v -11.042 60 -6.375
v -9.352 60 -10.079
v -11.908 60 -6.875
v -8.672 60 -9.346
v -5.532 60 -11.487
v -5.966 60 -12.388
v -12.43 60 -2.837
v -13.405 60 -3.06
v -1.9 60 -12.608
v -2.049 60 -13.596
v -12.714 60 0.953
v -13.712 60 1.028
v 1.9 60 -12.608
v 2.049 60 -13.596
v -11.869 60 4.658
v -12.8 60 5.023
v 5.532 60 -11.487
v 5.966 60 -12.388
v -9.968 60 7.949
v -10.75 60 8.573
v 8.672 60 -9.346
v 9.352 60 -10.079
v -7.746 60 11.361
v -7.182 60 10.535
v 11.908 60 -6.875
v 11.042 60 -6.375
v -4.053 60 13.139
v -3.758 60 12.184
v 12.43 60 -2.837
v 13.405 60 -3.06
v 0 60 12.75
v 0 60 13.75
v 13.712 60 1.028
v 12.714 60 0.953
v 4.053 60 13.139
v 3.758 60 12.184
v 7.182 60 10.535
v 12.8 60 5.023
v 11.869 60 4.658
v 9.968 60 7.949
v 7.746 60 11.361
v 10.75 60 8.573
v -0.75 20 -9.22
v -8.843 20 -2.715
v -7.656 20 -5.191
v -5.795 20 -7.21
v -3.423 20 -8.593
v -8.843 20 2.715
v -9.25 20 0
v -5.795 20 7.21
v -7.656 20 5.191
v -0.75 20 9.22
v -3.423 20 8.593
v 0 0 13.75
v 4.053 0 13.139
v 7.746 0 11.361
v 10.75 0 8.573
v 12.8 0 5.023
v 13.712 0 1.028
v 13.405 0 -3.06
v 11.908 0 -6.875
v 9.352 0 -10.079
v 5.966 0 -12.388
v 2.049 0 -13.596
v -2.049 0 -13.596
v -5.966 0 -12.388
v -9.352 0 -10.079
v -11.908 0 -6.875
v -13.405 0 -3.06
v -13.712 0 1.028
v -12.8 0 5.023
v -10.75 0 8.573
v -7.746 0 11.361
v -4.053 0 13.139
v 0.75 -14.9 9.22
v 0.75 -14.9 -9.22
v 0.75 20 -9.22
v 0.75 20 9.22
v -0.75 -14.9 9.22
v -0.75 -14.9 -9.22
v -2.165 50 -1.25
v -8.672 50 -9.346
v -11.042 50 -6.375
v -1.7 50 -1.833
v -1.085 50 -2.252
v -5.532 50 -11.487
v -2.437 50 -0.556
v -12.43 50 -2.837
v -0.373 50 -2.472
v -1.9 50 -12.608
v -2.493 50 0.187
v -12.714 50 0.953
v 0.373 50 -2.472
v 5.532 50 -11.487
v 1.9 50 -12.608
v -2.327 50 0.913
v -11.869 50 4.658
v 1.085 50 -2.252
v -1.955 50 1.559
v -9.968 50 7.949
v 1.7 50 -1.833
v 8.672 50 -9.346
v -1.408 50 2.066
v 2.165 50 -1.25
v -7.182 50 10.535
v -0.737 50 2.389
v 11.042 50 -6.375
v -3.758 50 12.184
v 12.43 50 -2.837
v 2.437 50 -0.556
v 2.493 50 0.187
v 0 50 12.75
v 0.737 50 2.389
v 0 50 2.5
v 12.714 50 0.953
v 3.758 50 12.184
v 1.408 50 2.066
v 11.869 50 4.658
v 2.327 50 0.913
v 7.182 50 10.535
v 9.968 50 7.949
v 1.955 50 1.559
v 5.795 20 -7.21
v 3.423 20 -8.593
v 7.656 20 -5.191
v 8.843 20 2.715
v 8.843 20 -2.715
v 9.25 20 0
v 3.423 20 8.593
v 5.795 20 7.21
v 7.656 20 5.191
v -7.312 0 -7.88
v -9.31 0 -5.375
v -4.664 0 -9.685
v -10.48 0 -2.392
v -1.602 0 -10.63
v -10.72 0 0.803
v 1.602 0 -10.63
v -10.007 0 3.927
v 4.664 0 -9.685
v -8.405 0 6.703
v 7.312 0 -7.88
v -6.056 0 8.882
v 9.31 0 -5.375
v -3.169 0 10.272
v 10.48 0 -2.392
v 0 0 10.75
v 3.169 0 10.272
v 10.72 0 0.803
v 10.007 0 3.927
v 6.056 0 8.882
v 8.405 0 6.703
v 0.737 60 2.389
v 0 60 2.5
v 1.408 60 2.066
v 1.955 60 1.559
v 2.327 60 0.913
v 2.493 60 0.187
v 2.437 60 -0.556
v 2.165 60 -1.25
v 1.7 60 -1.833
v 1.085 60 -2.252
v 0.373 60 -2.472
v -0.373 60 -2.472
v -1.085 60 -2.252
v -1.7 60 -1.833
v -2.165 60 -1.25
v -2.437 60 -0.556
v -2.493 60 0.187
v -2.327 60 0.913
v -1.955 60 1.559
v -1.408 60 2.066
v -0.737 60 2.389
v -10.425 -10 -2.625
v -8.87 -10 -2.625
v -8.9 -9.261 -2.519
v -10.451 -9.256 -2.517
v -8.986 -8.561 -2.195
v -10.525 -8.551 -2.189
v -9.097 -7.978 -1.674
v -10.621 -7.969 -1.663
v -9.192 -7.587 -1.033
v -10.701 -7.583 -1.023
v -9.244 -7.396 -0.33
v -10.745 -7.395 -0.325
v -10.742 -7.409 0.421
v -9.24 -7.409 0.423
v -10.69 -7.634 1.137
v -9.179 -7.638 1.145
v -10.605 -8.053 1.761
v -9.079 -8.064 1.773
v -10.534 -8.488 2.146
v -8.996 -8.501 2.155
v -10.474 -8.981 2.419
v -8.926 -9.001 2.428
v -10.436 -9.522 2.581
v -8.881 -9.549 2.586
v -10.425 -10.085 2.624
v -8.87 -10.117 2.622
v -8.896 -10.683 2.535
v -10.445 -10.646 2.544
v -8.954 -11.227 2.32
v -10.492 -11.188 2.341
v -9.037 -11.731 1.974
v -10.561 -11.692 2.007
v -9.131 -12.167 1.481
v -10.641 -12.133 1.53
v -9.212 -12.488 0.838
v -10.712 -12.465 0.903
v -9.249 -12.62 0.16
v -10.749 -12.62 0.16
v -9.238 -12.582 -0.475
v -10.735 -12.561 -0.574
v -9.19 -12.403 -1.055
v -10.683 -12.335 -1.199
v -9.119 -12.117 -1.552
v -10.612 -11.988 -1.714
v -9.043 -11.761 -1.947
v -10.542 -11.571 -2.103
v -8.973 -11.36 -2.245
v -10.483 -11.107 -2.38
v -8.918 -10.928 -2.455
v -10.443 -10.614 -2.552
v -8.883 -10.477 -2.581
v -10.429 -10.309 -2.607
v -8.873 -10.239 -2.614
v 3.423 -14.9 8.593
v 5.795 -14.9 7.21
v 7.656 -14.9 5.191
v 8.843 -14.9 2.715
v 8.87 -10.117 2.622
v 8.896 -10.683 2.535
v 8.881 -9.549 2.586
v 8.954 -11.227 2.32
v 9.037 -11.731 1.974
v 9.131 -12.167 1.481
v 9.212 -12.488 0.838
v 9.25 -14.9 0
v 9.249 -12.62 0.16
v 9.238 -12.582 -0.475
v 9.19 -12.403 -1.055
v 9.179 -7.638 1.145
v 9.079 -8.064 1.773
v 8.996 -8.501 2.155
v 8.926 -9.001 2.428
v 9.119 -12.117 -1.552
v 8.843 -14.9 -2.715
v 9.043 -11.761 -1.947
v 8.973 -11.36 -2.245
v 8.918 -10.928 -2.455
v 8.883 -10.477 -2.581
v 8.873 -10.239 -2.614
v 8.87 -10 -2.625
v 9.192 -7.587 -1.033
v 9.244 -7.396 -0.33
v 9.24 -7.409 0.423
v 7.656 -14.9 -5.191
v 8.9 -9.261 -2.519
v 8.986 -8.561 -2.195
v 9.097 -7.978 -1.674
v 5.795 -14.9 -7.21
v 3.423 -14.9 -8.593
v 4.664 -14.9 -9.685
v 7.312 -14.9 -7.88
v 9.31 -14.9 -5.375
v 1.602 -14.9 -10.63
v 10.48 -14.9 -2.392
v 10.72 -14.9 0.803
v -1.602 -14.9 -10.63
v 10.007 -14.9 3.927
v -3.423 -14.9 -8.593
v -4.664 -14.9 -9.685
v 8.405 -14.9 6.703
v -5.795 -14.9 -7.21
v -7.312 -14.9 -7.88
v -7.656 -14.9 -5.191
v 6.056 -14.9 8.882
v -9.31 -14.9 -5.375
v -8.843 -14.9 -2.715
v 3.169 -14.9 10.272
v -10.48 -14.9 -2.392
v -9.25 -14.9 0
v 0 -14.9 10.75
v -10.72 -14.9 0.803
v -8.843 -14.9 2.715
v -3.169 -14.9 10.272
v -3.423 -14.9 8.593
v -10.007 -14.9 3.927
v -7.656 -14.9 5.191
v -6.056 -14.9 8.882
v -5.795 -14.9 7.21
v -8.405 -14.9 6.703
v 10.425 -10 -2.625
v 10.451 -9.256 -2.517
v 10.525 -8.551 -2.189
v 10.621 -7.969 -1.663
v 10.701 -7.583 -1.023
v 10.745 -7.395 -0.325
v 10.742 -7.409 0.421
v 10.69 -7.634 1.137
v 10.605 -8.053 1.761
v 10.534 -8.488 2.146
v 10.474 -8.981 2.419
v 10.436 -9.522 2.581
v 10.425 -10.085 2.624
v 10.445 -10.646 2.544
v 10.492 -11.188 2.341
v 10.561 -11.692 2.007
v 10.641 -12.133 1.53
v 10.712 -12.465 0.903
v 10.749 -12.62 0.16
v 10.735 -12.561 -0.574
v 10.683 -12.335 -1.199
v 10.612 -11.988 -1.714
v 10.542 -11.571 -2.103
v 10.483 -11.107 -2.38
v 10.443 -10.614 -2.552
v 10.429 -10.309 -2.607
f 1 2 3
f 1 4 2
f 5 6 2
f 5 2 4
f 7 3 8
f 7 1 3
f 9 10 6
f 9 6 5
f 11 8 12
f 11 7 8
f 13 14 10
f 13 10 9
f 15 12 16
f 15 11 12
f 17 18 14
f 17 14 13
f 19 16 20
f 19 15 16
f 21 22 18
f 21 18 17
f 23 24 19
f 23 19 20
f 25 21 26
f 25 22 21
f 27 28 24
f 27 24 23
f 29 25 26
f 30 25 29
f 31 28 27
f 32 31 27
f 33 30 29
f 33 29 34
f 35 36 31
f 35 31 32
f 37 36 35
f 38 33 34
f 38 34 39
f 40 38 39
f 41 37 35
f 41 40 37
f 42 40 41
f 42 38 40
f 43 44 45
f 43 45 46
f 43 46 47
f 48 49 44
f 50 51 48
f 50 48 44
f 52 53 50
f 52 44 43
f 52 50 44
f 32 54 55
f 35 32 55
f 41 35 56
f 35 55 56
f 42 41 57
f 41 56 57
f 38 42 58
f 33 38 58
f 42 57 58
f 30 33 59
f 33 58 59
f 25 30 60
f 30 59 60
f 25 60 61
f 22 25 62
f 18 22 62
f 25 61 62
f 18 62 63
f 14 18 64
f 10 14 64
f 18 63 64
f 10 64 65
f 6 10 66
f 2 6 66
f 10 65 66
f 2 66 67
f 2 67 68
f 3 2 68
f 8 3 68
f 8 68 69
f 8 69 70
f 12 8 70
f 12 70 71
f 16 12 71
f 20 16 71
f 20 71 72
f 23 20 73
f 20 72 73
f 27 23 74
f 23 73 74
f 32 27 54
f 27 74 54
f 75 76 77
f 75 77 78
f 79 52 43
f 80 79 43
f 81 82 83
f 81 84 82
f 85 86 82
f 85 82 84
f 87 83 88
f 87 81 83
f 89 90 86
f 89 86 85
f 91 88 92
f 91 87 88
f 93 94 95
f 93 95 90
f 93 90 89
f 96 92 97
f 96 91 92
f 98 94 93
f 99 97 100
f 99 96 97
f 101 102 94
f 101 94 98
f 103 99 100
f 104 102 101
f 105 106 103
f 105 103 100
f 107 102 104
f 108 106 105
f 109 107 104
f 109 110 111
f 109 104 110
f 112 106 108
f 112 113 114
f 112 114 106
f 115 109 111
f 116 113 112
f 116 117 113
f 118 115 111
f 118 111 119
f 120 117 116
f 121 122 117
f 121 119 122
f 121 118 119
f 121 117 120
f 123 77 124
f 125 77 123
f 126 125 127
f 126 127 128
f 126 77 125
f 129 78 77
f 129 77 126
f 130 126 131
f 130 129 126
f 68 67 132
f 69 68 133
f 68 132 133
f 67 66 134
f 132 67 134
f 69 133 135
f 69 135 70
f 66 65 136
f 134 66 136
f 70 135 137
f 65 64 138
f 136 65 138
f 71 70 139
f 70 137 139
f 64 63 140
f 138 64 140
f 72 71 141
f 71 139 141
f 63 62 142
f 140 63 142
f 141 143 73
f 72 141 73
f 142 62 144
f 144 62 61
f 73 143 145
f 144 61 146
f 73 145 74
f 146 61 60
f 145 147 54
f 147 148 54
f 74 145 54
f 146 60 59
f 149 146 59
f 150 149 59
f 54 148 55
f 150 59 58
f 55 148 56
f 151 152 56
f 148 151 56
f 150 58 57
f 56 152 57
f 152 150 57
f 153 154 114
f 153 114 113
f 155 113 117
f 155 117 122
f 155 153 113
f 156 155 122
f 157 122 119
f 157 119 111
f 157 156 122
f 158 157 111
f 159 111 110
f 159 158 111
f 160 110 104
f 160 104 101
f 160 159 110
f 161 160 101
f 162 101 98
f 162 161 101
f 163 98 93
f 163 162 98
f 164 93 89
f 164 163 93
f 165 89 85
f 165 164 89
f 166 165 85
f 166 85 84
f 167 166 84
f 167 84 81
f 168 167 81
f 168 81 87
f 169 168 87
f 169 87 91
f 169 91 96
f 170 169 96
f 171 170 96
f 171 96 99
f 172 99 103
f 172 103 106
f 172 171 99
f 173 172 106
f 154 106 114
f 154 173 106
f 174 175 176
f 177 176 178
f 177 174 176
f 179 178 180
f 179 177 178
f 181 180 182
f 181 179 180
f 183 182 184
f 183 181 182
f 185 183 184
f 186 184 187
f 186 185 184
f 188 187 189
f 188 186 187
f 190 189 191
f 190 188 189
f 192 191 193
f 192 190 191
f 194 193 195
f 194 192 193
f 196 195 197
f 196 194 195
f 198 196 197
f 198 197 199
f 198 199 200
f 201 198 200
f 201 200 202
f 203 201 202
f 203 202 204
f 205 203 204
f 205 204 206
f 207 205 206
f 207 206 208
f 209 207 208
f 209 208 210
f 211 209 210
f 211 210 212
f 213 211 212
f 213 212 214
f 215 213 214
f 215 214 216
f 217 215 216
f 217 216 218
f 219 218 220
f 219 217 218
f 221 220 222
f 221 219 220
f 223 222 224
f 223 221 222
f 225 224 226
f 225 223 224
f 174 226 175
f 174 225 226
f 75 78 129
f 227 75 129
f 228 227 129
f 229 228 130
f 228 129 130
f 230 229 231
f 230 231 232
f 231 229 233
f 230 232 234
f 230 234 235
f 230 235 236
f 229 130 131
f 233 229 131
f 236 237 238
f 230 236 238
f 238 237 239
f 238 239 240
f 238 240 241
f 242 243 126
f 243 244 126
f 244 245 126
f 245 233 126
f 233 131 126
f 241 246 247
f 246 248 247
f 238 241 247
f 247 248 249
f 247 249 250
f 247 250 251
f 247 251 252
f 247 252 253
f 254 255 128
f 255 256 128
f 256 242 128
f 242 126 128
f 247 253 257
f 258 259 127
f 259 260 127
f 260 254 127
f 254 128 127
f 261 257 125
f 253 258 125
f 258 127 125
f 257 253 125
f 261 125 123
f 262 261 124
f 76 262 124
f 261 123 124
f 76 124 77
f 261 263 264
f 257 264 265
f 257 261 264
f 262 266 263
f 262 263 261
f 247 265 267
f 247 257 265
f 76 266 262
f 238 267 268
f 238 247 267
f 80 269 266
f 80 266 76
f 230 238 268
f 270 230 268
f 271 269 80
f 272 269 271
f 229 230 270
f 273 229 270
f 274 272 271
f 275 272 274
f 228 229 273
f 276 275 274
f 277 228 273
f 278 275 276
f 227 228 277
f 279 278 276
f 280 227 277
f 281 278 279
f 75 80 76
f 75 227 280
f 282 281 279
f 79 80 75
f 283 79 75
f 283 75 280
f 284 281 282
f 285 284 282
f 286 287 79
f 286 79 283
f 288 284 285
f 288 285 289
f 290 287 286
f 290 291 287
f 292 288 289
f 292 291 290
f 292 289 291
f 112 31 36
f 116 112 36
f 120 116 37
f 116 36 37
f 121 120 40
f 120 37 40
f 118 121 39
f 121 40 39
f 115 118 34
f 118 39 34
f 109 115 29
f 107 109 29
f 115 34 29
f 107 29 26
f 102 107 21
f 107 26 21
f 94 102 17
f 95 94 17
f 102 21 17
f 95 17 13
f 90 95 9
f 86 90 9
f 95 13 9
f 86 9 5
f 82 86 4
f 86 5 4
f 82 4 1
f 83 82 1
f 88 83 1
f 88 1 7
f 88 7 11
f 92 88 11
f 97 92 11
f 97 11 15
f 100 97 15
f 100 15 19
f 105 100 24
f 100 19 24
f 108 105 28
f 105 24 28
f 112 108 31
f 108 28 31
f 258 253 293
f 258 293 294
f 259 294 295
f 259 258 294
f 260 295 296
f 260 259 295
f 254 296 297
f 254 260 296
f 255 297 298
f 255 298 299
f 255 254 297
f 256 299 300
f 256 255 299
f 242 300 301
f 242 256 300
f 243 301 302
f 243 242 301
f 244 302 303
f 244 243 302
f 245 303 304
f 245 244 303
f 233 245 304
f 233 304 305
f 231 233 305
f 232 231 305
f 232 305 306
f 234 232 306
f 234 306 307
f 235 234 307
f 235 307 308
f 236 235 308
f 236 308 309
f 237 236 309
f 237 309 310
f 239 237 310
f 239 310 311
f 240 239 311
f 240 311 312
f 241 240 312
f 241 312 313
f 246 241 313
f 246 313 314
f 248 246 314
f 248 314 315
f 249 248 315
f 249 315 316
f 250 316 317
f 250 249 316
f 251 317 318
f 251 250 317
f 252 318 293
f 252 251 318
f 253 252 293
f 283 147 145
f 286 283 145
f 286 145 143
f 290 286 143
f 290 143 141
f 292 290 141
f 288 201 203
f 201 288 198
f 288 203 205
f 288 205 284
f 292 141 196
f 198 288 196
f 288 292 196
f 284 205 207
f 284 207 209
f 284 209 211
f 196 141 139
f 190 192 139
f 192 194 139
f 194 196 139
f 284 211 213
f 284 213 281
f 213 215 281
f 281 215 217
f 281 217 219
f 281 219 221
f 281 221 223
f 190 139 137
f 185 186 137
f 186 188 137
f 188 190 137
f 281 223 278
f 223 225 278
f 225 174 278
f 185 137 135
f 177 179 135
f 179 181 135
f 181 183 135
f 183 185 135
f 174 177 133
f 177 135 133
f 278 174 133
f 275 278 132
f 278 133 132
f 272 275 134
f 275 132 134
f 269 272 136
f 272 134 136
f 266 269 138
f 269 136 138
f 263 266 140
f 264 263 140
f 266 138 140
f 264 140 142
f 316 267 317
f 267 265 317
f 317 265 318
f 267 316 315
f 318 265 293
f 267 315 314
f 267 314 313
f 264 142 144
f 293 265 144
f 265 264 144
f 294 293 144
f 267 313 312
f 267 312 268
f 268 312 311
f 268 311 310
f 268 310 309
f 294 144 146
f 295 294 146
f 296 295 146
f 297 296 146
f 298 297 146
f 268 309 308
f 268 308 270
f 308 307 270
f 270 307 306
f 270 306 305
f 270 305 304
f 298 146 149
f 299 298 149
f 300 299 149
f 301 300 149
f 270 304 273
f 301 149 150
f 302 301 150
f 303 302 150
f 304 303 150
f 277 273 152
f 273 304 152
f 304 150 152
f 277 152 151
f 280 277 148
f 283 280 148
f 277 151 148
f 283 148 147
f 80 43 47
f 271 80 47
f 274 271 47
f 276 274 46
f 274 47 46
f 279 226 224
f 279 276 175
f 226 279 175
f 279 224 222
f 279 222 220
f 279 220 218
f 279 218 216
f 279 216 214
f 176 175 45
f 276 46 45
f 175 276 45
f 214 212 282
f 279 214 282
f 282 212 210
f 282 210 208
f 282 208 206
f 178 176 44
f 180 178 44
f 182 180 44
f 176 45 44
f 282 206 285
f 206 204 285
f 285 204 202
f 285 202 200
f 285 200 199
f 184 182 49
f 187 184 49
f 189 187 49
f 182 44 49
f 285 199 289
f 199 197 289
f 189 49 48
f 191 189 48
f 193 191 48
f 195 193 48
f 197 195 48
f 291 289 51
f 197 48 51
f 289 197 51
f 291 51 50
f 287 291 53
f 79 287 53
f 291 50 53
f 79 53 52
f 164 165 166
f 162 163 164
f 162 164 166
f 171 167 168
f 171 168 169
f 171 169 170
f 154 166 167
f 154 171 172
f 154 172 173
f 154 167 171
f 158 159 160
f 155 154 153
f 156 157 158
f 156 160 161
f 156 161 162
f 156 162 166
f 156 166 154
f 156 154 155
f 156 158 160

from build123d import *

# Parameters (mm, degrees)
SKETCH1_R                       = 13.75
BOSS_EXTRUDE1_DEPTH             = 60
SKETCH5_R                       = 10.75
BOSS_EXTRUDE2_DEPTH             = 14.9
CUT_EXTRUDE1_START              = -20
CUT_EXTRUDE1_DEPTH              = 20
CUT_EXTRUDE2_DEPTH              = 64.072379058
CUT_EXTRUDE2_DEPTH_BACK         = 64.072379058
SKETCH7_R                       = 2.625
BOSS_EXTRUDE3_REACH             = 65.072
SKETCH8_R                       = 2.625
BOSS_EXTRUDE3_DIRECTION_2_REACH = 65.072
SKETCH9_R                       = 12.75
SKETCH9_R_2                     = 2.5
CUT_EXTRUDE3_DEPTH              = 10


with BuildPart() as part:
    # Sketch1 → Boss-Extrude1 (new body)
    with BuildSketch(Plane(origin=(0, 0, 0), x_dir=(1, 0, 0), z_dir=(0, 1, 0))):
        Circle(SKETCH1_R)
    extrude(amount=BOSS_EXTRUDE1_DEPTH)

    # Sketch5 → Boss-Extrude2 (add)
    with BuildSketch(Plane.XZ):
        Circle(SKETCH5_R)
        with BuildLine():
            ThreePointArc((-0.75, -9.219544457), (-9.25, 0), (-0.75, 9.219544457))
            Line((-0.75, 9.219544457), (-0.75, -9.219544457))
        make_face(mode=Mode.SUBTRACT)
        with BuildLine():
            Line((0.75, -9.219544457), (0.75, 9.219544457))
            ThreePointArc((0.75, 9.219544457), (9.25, 0), (0.75, -9.219544457))
        make_face(mode=Mode.SUBTRACT)
    extrude(amount=BOSS_EXTRUDE2_DEPTH)

    # Sketch6 → Cut-Extrude1 (cut)
    with BuildSketch(Plane.XZ.offset(CUT_EXTRUDE1_START)):
        with BuildLine():
            Line((-0.75, -9.219544457), (-0.75, 9.219544457))
            ThreePointArc((-0.75, 9.219544457), (-9.25, 0), (-0.75, -9.219544457))
        make_face()
        with BuildLine():
            ThreePointArc((0.75, -9.219544457), (9.25, 0), (0.75, 9.219544457))
            Line((0.75, 9.219544457), (0.75, -9.219544457))
        make_face()
    extrude(amount=CUT_EXTRUDE1_DEPTH, mode=Mode.SUBTRACT)

    # Sketch7 → Cut-Extrude2 (cut, two sides: drawn at the far end of the back side and taken through both)
    with BuildSketch(Plane(origin=(0, 0, 0), x_dir=(0, 0, -1), z_dir=(1, 0, 0)).offset(-CUT_EXTRUDE2_DEPTH_BACK)):
        with Locations((0, -10)):
            Circle(SKETCH7_R)
    extrude(amount=CUT_EXTRUDE2_DEPTH + CUT_EXTRUDE2_DEPTH_BACK, mode=Mode.SUBTRACT)

    # Boss-Extrude3: up to this face of the body (flat: up to its plane)
    boss_extrude3_end = Plane(part.part.faces().sort_by_distance((0.75, 2.986865704, 0))[0])
    # Sketch8 → Boss-Extrude3 (add, up to the picked face)
    with BuildSketch(Plane(origin=(0, 0, 0), x_dir=(0, 0, -1), z_dir=(1, 0, 0)), mode=Mode.PRIVATE) as boss_extrude3_sk1:
        with Locations((0, -10)):
            Circle(SKETCH8_R)
    boss_extrude3_tool1 = split(extrude(boss_extrude3_sk1.sketch, amount=BOSS_EXTRUDE3_REACH, mode=Mode.PRIVATE), bisect_by=boss_extrude3_end, keep=Keep.BOTH, mode=Mode.PRIVATE)
    add(boss_extrude3_tool1.solids().sort_by(Axis((0, -10, 0), (1, 0, 0)))[0])

    # Boss-Extrude3 direction 2: up to this face of the body (flat: up to its plane)
    boss_extrude3_direction_2_end = Plane(part.part.faces().sort_by_distance((-0.75, 2.986865704, 0))[0])
    # Sketch8 → Boss-Extrude3 direction 2 (add, up to the picked face)
    with BuildSketch(Plane(origin=(0, 0, 0), x_dir=(0, 0, -1), z_dir=(1, 0, 0)), mode=Mode.PRIVATE) as boss_extrude3_direction_2_sk1:
        with Locations((0, -10)):
            Circle(SKETCH8_R)
    boss_extrude3_direction_2_tool1 = split(extrude(boss_extrude3_direction_2_sk1.sketch, amount=-BOSS_EXTRUDE3_DIRECTION_2_REACH, mode=Mode.PRIVATE), bisect_by=boss_extrude3_direction_2_end, keep=Keep.BOTH, mode=Mode.PRIVATE)
    add(boss_extrude3_direction_2_tool1.solids().sort_by(Axis((0, -10, 0), (-1, 0, 0)))[0])

    # Sketch9 → Cut-Extrude3 (cut)
    with BuildSketch(Plane(origin=(0, 60, 0), x_dir=(1, 0, 0), z_dir=(0, 1, 0))):
        Circle(SKETCH9_R)
        Circle(SKETCH9_R_2, mode=Mode.SUBTRACT)
    extrude(amount=-CUT_EXTRUDE3_DEPTH, mode=Mode.SUBTRACT)


solid = part.part
